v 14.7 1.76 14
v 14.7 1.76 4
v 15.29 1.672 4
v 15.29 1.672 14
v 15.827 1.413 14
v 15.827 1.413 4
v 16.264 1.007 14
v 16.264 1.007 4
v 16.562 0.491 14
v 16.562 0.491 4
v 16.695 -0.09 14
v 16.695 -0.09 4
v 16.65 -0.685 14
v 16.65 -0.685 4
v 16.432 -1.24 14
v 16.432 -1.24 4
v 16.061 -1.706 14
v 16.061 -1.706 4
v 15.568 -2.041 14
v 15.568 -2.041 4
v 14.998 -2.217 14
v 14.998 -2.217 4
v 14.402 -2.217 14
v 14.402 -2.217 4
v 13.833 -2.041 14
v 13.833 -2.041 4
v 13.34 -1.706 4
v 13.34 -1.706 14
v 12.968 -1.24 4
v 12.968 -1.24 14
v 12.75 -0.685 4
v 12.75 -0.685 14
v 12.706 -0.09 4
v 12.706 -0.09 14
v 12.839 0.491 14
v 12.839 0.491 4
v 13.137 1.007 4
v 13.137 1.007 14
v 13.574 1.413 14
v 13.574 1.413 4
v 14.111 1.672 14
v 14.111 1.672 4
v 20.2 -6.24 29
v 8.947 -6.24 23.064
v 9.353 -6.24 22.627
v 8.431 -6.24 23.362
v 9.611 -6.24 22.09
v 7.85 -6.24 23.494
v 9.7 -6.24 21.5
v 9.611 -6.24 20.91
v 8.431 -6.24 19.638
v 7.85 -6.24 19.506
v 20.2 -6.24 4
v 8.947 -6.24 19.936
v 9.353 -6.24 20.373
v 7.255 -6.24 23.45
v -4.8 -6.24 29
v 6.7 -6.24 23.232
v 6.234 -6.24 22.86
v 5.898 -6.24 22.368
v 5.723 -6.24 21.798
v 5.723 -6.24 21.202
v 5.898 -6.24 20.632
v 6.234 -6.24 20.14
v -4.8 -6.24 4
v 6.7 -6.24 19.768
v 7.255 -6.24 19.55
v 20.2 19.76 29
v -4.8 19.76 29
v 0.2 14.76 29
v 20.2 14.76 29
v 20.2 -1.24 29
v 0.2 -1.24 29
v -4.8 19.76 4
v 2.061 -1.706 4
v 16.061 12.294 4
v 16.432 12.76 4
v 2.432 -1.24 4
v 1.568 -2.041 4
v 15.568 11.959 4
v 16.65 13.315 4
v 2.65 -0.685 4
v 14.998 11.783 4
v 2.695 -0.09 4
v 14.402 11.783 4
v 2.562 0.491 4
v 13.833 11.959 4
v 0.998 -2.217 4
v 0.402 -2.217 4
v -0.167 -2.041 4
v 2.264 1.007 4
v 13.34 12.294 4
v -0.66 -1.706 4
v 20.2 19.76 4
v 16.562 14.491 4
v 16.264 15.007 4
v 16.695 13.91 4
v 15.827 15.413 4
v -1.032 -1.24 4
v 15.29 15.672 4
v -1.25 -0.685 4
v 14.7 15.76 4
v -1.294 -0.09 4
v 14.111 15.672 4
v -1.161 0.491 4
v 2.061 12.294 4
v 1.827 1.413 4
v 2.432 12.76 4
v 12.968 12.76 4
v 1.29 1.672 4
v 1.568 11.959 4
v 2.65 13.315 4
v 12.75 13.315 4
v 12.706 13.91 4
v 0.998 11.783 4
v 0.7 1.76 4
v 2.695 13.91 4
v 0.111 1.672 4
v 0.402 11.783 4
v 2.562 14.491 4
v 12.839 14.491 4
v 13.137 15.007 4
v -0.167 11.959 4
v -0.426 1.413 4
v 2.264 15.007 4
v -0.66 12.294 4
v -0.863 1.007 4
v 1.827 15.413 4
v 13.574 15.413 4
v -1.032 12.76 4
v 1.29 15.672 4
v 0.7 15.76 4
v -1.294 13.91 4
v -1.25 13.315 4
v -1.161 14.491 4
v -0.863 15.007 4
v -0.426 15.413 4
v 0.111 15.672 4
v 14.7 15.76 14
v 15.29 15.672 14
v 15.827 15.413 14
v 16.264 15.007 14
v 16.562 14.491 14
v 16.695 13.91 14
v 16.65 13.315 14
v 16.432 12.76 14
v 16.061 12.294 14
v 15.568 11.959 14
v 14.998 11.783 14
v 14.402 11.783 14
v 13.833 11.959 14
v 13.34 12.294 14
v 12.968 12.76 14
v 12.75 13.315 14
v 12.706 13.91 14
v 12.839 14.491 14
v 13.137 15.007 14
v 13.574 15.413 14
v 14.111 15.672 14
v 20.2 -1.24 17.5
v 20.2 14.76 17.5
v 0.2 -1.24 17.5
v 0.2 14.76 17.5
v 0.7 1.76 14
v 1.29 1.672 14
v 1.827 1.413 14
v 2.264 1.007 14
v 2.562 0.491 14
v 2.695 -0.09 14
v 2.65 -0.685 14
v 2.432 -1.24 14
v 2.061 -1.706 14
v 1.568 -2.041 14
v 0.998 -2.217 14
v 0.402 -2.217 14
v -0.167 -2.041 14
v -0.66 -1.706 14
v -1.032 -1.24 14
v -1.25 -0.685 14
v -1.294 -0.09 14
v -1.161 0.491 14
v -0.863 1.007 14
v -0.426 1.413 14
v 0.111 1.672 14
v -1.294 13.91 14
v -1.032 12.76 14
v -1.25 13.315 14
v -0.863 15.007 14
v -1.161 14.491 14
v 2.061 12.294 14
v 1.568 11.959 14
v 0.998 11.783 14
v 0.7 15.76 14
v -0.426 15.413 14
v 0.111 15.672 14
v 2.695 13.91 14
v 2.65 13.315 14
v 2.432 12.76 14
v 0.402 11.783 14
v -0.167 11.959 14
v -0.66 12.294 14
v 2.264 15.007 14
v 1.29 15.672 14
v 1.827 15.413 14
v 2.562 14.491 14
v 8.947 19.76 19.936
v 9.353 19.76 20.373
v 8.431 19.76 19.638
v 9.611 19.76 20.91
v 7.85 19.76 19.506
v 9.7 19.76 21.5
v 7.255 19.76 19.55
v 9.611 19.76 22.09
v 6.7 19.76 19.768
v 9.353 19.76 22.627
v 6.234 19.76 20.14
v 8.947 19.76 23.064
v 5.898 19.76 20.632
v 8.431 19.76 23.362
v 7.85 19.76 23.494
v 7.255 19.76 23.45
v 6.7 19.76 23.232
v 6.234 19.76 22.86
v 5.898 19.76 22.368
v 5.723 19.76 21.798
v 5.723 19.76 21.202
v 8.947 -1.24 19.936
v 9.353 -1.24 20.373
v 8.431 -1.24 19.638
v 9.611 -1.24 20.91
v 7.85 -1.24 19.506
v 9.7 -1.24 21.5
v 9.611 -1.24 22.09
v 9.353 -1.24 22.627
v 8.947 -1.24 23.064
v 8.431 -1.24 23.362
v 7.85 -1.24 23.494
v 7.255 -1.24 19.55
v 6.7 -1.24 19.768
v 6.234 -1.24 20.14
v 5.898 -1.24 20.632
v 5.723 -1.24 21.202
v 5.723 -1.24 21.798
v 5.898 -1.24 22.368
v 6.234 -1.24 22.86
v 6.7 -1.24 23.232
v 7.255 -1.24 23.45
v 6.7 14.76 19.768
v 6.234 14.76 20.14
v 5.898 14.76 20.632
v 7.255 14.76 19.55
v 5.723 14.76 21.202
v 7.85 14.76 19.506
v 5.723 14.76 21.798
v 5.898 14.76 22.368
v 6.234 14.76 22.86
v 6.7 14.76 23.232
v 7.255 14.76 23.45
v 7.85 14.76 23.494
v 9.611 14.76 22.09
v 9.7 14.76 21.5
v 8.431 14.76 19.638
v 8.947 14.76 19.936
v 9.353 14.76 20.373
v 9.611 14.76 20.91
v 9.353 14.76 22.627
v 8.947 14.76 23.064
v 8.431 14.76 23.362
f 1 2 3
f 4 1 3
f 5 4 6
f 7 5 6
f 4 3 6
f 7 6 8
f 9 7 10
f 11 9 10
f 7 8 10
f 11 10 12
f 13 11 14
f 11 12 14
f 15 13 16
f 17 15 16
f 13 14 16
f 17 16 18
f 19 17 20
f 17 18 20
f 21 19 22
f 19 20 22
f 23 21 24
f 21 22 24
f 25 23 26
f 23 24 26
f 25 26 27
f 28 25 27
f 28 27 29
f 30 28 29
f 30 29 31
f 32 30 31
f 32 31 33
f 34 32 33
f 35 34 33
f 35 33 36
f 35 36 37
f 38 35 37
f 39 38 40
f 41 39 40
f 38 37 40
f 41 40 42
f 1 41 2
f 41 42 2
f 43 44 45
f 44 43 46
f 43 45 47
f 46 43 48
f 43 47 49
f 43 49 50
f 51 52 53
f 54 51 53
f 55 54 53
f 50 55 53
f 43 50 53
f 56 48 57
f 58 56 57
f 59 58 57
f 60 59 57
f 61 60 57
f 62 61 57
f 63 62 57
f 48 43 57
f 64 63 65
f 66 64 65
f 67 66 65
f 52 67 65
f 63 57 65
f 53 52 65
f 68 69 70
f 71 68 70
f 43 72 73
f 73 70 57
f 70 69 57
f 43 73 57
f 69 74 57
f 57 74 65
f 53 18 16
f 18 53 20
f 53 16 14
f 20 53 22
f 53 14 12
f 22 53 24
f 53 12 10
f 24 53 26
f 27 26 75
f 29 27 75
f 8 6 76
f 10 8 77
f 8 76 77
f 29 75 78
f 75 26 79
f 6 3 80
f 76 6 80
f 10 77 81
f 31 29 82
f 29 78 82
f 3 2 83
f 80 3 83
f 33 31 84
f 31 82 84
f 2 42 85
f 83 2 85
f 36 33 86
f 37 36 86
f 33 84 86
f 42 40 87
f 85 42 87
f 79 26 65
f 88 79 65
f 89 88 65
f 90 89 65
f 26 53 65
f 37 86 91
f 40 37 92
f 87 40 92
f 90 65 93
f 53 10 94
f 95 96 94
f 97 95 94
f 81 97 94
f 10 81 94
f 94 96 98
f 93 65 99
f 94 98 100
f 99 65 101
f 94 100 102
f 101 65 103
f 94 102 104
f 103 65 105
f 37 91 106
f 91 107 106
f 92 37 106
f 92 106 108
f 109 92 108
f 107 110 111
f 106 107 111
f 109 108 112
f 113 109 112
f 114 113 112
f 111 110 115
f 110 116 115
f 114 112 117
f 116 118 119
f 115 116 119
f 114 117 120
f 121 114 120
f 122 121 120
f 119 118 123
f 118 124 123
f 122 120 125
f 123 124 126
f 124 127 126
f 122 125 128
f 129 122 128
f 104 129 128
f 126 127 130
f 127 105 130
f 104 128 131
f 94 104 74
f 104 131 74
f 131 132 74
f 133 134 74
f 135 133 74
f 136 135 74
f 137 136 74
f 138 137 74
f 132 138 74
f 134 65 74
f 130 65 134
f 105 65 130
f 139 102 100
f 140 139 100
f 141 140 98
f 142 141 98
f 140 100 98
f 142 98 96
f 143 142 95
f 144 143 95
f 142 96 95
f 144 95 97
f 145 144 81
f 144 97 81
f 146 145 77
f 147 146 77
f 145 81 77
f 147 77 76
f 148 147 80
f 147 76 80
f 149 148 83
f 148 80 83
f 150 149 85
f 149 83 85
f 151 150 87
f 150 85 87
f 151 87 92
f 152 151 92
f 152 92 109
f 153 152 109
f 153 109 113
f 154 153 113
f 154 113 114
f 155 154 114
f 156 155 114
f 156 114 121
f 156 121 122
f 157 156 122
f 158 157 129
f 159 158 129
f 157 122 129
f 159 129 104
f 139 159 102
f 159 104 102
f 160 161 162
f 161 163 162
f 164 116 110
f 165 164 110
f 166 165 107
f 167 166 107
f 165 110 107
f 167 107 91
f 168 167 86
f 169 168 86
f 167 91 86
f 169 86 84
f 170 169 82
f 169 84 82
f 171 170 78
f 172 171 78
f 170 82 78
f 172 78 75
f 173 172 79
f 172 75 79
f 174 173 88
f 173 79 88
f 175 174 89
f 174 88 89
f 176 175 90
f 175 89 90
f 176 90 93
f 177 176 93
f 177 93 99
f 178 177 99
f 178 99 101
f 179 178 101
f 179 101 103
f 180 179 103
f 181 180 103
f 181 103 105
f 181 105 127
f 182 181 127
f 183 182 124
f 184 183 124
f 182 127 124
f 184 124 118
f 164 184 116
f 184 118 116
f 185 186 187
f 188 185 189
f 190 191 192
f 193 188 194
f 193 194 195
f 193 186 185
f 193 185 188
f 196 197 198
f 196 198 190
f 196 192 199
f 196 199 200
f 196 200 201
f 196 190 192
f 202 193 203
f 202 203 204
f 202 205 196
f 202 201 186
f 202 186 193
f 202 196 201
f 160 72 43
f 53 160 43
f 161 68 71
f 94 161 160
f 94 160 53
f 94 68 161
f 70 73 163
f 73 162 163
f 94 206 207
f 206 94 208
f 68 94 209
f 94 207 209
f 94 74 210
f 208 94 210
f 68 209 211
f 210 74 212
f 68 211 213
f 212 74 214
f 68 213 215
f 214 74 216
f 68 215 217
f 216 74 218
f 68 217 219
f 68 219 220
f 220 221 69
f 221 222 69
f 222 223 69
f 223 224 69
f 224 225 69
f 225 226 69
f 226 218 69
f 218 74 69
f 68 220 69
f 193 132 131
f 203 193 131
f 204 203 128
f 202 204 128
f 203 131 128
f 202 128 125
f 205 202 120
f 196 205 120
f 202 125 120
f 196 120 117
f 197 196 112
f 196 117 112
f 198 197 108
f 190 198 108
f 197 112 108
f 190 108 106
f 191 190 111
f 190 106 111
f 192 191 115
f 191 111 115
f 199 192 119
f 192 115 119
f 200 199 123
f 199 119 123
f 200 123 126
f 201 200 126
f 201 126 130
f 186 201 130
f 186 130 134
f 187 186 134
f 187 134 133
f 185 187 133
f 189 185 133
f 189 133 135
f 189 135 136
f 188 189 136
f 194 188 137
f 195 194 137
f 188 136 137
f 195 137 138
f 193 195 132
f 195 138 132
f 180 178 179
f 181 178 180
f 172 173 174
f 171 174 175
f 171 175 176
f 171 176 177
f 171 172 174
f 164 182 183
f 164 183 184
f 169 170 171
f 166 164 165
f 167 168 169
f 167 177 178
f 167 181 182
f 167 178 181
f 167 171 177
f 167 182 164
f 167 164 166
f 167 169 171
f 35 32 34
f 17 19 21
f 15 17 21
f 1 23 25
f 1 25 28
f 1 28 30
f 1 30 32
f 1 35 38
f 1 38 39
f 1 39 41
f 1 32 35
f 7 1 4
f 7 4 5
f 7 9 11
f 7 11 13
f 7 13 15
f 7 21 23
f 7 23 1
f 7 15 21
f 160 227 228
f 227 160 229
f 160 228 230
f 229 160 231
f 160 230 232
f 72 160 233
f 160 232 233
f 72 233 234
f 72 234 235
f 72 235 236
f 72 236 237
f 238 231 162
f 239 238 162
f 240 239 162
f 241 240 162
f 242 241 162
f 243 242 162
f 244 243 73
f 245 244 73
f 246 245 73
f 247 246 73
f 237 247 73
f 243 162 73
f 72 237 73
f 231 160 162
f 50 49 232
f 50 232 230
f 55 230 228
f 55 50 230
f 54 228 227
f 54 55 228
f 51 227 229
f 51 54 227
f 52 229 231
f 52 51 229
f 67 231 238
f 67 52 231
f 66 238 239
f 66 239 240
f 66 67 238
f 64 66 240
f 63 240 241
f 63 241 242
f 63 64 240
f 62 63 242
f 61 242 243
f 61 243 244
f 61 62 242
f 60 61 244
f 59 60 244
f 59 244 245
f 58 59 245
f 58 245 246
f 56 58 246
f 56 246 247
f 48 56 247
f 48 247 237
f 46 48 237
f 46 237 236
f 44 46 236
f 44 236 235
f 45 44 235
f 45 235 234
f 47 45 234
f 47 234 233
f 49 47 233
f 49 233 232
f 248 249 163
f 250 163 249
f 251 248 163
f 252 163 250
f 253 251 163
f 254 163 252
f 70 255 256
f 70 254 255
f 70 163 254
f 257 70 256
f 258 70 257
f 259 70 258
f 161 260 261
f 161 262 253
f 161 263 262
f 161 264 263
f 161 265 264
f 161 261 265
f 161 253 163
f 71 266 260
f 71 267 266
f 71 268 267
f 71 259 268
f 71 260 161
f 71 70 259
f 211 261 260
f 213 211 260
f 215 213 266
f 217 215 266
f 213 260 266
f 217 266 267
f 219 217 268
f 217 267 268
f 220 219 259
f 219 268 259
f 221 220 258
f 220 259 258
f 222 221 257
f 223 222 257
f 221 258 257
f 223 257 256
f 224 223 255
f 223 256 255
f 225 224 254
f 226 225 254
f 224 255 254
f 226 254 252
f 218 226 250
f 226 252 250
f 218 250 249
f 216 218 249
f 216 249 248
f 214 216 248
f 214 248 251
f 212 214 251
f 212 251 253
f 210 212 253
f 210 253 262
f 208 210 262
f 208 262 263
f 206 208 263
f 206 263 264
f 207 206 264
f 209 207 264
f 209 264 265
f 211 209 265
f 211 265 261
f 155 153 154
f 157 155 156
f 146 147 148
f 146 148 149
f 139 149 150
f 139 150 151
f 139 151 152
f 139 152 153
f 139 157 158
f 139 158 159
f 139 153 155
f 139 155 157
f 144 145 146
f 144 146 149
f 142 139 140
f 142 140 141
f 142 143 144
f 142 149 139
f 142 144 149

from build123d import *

# Parameters (mm, degrees)
BOSS_EXTRUDE1_DEPTH = 25
SKETCH3_R           = 2
CUT_EXTRUDE1_DEPTH  = 15
SKETCH2_W           = 4
SKETCH2_H           = 26
BOSS_EXTRUDE2_DEPTH = 20
SKETCH7_W           = 15
SKETCH7_H           = 5
BOSS_EXTRUDE4_DEPTH = 25
CUT_EXTRUDE2_DEPTH  = 20
BOSS_EXTRUDE5_DEPTH = 4
CUT_EXTRUDE3_START  = -10
SKETCH10_R          = 2
CUT_EXTRUDE3_DEPTH  = 10
SKETCH11_W          = 15
SKETCH11_H          = 15
BOSS_EXTRUDE6_DEPTH = 14
SKETCH14_W          = 15
SKETCH14_H          = 15
CUT_EXTRUDE5_DEPTH  = 0.5
BOSS_EXTRUDE7_DEPTH = 5
SKETCH13_R          = 2
CUT_EXTRUDE6_DEPTH  = 10
SKETCH17_W          = 20
SKETCH17_H          = 11.5
CUT_EXTRUDE7_DEPTH  = 1


with BuildPart() as part:
    # Sketch1 → Boss-Extrude1 (new body)
    with BuildSketch(Plane.XY):
        Polygon((15.200344072, 13.760447293), (0.200344072, 13.760447293), (0.200344072, -6.239552707), (-4.799655928, -6.239552707), (-4.799655928, 19.760447293), (15.200344072, 19.760447293), align=None)
    extrude(amount=BOSS_EXTRUDE1_DEPTH)

    # Sketch3 → Cut-Extrude1 (cut)
    with BuildSketch(Plane.XZ.offset(-13.760447293)):
        with Locations((7.700344072, 21.5)):
            Circle(SKETCH3_R)
    extrude(amount=-CUT_EXTRUDE1_DEPTH, mode=Mode.SUBTRACT)

    # Sketch2 → Boss-Extrude2 (add)
    with BuildSketch(Plane.ZY.offset(4.799655928)):
        with Locations((2, 6.760447293)):
            Rectangle(SKETCH2_W, SKETCH2_H)
    extrude(amount=-BOSS_EXTRUDE2_DEPTH)

    # Sketch7 → Boss-Extrude4 (add)
    with BuildSketch(Plane.XY.offset(4)):
        with Locations((7.700344072, -3.739552707)):
            Rectangle(SKETCH7_W, SKETCH7_H)
    extrude(amount=BOSS_EXTRUDE4_DEPTH)

    # Sketch8 → Cut-Extrude2 (cut)
    with BuildSketch(Plane(origin=(15.200344072, 0, 0), x_dir=(0, 0, -1), z_dir=(1, 0, 0))):
        Polygon((-4, -1.239552707), (-4, -6.239552707), (0, -6.239552707), (0, 19.760447293), (-4, 19.760447293), (-4, 13.760447293), align=None)
    extrude(amount=-CUT_EXTRUDE2_DEPTH, mode=Mode.SUBTRACT)

    # Sketch9 → Boss-Extrude5 (add)
    with BuildSketch(Plane.XY.offset(25)):
        Polygon((15.200344072, 13.760447293), (15.200344072, 19.760447293), (-4.799655928, 19.760447293), (-4.799655928, -6.239552707), (0.200344072, -6.239552707), (0.200344072, -1.239552707), (0.200344072, 13.760447293), align=None)
    extrude(amount=BOSS_EXTRUDE5_DEPTH)

    # Sketch10 → Cut-Extrude3 (cut)
    with BuildSketch(Plane(origin=(0, -1.239552707, 0), x_dir=(1, 0, 0), z_dir=(0, 1, 0)).offset(CUT_EXTRUDE3_START)):
        with Locations((7.700344072, -21.5)):
            Circle(SKETCH10_R)
    extrude(amount=CUT_EXTRUDE3_DEPTH, mode=Mode.SUBTRACT)

    # Sketch11 → Boss-Extrude6 (add)
    with BuildSketch(Plane(origin=(0, 0, 4), x_dir=(-1, 0, 0), z_dir=(0, 0, -1))):
        with Locations((-7.700344072, 6.260447293)):
            Rectangle(SKETCH11_W, SKETCH11_H)
    extrude(amount=-BOSS_EXTRUDE6_DEPTH)

    # Sketch14 → Cut-Extrude5 (cut)
    with BuildSketch(Plane.XY.offset(18)):
        with Locations((7.700344072, 6.260447293)):
            Rectangle(SKETCH14_W, SKETCH14_H)
    extrude(amount=-CUT_EXTRUDE5_DEPTH, mode=Mode.SUBTRACT)

    # Sketch16 → Boss-Extrude7 (add)
    with BuildSketch(Plane(origin=(15.200344072, 0, 0), x_dir=(0, 0, -1), z_dir=(1, 0, 0))):
        Polygon((-29, 13.760447293), (-17.5, 13.760447293), (-17.5, -1.239552707), (-29, -1.239552707), (-29, -6.239552707), (-4, -6.239552707), (-4, 19.760447293), (-29, 19.760447293), align=None)
    extrude(amount=BOSS_EXTRUDE7_DEPTH)

    # Sketch13 → Cut-Extrude6 (cut)
    with BuildSketch(Plane(origin=(0, 0, 4), x_dir=(-1, 0, 0), z_dir=(0, 0, -1))):
        with Locations(Location((-14.700344072, -0.239552707, 0), (0, 0, 90))):
            Circle(SKETCH13_R)
        with Locations(Location((-14.700344072, 13.760447293, 0), (0, 0, 90))):
            Circle(SKETCH13_R)
        with Locations(Location((-0.700344072, 13.760447293, 0), (0, 0, 90))):
            Circle(SKETCH13_R)
        with Locations(Location((-0.700344072, -0.239552707, 0), (0, 0, 90))):
            Circle(SKETCH13_R)
    extrude(amount=-CUT_EXTRUDE6_DEPTH, mode=Mode.SUBTRACT)

    # Sketch17 → Cut-Extrude7 (cut)
    with BuildSketch(Plane.XZ.offset(-13.760447293)):
        with Locations((10.200344072, 23.25)):
            Rectangle(SKETCH17_W, SKETCH17_H)
    extrude(amount=-CUT_EXTRUDE7_DEPTH, mode=Mode.SUBTRACT)


solid = part.part
